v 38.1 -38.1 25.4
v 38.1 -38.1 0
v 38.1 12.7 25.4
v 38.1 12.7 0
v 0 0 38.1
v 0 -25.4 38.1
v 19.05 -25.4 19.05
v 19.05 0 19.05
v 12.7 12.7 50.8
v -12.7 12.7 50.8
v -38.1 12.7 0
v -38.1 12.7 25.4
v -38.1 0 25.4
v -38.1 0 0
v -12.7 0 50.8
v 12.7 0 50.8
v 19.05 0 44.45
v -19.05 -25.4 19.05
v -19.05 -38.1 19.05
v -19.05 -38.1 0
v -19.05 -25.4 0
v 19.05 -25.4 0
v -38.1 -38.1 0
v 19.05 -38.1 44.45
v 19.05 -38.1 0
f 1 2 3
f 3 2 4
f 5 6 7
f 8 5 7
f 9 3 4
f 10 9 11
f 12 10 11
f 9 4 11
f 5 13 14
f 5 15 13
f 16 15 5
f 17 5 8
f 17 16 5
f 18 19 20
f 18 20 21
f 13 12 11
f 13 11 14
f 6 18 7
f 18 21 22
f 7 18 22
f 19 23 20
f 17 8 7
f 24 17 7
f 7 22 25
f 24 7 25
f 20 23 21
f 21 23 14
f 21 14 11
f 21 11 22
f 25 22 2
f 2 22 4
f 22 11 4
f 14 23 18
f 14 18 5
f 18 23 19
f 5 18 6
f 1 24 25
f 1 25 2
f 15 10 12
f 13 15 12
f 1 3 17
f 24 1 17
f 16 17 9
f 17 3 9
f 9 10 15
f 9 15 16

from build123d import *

# Parameters (mm, degrees)
F0_W     = 19.05
F0_H     = 12.7
F0_W_2   = 31.75
F1_DEPTH = 50.8
F3_DEPTH = 50.801
F7_DEPTH = 38.1
F8_DEPTH = 25.4


# Not quite as in the source:
# - a feature names something its author has since deleted; it is built from what else it names


with BuildPart() as f1:
    # F0 (on Top) → F1 (new body)
    with BuildSketch(Plane.XY):
        with Locations((-28.575, 6.35)):
            Rectangle(F0_W, F0_H)
        with Locations((22.225, 6.35)):
            Rectangle(F0_W_2, F0_H)
        Polygon((-19.05, 0), (0, 0), (6.35, 0), (6.35, 12.7), (-19.05, 12.7), align=None)
        Polygon((6.35, 0), (0, 0), (38.1, -38.1), (38.1, 0), align=None)
        Polygon((-38.1, -38.1), (0, 0), (-19.05, 0), (-38.1, 0), align=None)
        Polygon((38.1, -38.1), (0, 0), (-38.1, -38.1), (-19.05, -38.1), (-19.05, -25.4), (19.05, -25.4), (19.05, -38.1), align=None)
    extrude(amount=F1_DEPTH)

    # F2 (on face) → F3 (cut, through all)
    with BuildSketch(Plane(origin=(0, 12.7, 0), x_dir=(-1, 0, 0), z_dir=(0, 1, 0))):
        Polygon((-38.1, 50.8), (-38.1, 25.4), (-12.7, 50.8), align=None)
        Polygon((38.1, 50.8), (12.7, 50.8), (38.1, 25.4), align=None)
    extrude(amount=-F3_DEPTH, mode=Mode.SUBTRACT)

    # F4 (on face) → F7 (cut)
    with BuildSketch(Plane.XZ.offset(38.1)):
        Polygon((-38.1, 25.4), (-38.1, 0), (-19.05, 19.05), (-19.05, 44.45), align=None)
    extrude(amount=-F7_DEPTH, mode=Mode.SUBTRACT)

    # F5 (on face) → F8 (cut)
    with BuildSketch(Plane.XZ.offset(25.4)):
        Polygon((-19.05, 44.45), (-19.05, 19.05), (0, 38.1), (19.05, 19.05), (19.05, 44.45), (12.7, 50.8), (-12.7, 50.8), align=None)
    extrude(amount=-F8_DEPTH, mode=Mode.SUBTRACT)


solid = f1.part
